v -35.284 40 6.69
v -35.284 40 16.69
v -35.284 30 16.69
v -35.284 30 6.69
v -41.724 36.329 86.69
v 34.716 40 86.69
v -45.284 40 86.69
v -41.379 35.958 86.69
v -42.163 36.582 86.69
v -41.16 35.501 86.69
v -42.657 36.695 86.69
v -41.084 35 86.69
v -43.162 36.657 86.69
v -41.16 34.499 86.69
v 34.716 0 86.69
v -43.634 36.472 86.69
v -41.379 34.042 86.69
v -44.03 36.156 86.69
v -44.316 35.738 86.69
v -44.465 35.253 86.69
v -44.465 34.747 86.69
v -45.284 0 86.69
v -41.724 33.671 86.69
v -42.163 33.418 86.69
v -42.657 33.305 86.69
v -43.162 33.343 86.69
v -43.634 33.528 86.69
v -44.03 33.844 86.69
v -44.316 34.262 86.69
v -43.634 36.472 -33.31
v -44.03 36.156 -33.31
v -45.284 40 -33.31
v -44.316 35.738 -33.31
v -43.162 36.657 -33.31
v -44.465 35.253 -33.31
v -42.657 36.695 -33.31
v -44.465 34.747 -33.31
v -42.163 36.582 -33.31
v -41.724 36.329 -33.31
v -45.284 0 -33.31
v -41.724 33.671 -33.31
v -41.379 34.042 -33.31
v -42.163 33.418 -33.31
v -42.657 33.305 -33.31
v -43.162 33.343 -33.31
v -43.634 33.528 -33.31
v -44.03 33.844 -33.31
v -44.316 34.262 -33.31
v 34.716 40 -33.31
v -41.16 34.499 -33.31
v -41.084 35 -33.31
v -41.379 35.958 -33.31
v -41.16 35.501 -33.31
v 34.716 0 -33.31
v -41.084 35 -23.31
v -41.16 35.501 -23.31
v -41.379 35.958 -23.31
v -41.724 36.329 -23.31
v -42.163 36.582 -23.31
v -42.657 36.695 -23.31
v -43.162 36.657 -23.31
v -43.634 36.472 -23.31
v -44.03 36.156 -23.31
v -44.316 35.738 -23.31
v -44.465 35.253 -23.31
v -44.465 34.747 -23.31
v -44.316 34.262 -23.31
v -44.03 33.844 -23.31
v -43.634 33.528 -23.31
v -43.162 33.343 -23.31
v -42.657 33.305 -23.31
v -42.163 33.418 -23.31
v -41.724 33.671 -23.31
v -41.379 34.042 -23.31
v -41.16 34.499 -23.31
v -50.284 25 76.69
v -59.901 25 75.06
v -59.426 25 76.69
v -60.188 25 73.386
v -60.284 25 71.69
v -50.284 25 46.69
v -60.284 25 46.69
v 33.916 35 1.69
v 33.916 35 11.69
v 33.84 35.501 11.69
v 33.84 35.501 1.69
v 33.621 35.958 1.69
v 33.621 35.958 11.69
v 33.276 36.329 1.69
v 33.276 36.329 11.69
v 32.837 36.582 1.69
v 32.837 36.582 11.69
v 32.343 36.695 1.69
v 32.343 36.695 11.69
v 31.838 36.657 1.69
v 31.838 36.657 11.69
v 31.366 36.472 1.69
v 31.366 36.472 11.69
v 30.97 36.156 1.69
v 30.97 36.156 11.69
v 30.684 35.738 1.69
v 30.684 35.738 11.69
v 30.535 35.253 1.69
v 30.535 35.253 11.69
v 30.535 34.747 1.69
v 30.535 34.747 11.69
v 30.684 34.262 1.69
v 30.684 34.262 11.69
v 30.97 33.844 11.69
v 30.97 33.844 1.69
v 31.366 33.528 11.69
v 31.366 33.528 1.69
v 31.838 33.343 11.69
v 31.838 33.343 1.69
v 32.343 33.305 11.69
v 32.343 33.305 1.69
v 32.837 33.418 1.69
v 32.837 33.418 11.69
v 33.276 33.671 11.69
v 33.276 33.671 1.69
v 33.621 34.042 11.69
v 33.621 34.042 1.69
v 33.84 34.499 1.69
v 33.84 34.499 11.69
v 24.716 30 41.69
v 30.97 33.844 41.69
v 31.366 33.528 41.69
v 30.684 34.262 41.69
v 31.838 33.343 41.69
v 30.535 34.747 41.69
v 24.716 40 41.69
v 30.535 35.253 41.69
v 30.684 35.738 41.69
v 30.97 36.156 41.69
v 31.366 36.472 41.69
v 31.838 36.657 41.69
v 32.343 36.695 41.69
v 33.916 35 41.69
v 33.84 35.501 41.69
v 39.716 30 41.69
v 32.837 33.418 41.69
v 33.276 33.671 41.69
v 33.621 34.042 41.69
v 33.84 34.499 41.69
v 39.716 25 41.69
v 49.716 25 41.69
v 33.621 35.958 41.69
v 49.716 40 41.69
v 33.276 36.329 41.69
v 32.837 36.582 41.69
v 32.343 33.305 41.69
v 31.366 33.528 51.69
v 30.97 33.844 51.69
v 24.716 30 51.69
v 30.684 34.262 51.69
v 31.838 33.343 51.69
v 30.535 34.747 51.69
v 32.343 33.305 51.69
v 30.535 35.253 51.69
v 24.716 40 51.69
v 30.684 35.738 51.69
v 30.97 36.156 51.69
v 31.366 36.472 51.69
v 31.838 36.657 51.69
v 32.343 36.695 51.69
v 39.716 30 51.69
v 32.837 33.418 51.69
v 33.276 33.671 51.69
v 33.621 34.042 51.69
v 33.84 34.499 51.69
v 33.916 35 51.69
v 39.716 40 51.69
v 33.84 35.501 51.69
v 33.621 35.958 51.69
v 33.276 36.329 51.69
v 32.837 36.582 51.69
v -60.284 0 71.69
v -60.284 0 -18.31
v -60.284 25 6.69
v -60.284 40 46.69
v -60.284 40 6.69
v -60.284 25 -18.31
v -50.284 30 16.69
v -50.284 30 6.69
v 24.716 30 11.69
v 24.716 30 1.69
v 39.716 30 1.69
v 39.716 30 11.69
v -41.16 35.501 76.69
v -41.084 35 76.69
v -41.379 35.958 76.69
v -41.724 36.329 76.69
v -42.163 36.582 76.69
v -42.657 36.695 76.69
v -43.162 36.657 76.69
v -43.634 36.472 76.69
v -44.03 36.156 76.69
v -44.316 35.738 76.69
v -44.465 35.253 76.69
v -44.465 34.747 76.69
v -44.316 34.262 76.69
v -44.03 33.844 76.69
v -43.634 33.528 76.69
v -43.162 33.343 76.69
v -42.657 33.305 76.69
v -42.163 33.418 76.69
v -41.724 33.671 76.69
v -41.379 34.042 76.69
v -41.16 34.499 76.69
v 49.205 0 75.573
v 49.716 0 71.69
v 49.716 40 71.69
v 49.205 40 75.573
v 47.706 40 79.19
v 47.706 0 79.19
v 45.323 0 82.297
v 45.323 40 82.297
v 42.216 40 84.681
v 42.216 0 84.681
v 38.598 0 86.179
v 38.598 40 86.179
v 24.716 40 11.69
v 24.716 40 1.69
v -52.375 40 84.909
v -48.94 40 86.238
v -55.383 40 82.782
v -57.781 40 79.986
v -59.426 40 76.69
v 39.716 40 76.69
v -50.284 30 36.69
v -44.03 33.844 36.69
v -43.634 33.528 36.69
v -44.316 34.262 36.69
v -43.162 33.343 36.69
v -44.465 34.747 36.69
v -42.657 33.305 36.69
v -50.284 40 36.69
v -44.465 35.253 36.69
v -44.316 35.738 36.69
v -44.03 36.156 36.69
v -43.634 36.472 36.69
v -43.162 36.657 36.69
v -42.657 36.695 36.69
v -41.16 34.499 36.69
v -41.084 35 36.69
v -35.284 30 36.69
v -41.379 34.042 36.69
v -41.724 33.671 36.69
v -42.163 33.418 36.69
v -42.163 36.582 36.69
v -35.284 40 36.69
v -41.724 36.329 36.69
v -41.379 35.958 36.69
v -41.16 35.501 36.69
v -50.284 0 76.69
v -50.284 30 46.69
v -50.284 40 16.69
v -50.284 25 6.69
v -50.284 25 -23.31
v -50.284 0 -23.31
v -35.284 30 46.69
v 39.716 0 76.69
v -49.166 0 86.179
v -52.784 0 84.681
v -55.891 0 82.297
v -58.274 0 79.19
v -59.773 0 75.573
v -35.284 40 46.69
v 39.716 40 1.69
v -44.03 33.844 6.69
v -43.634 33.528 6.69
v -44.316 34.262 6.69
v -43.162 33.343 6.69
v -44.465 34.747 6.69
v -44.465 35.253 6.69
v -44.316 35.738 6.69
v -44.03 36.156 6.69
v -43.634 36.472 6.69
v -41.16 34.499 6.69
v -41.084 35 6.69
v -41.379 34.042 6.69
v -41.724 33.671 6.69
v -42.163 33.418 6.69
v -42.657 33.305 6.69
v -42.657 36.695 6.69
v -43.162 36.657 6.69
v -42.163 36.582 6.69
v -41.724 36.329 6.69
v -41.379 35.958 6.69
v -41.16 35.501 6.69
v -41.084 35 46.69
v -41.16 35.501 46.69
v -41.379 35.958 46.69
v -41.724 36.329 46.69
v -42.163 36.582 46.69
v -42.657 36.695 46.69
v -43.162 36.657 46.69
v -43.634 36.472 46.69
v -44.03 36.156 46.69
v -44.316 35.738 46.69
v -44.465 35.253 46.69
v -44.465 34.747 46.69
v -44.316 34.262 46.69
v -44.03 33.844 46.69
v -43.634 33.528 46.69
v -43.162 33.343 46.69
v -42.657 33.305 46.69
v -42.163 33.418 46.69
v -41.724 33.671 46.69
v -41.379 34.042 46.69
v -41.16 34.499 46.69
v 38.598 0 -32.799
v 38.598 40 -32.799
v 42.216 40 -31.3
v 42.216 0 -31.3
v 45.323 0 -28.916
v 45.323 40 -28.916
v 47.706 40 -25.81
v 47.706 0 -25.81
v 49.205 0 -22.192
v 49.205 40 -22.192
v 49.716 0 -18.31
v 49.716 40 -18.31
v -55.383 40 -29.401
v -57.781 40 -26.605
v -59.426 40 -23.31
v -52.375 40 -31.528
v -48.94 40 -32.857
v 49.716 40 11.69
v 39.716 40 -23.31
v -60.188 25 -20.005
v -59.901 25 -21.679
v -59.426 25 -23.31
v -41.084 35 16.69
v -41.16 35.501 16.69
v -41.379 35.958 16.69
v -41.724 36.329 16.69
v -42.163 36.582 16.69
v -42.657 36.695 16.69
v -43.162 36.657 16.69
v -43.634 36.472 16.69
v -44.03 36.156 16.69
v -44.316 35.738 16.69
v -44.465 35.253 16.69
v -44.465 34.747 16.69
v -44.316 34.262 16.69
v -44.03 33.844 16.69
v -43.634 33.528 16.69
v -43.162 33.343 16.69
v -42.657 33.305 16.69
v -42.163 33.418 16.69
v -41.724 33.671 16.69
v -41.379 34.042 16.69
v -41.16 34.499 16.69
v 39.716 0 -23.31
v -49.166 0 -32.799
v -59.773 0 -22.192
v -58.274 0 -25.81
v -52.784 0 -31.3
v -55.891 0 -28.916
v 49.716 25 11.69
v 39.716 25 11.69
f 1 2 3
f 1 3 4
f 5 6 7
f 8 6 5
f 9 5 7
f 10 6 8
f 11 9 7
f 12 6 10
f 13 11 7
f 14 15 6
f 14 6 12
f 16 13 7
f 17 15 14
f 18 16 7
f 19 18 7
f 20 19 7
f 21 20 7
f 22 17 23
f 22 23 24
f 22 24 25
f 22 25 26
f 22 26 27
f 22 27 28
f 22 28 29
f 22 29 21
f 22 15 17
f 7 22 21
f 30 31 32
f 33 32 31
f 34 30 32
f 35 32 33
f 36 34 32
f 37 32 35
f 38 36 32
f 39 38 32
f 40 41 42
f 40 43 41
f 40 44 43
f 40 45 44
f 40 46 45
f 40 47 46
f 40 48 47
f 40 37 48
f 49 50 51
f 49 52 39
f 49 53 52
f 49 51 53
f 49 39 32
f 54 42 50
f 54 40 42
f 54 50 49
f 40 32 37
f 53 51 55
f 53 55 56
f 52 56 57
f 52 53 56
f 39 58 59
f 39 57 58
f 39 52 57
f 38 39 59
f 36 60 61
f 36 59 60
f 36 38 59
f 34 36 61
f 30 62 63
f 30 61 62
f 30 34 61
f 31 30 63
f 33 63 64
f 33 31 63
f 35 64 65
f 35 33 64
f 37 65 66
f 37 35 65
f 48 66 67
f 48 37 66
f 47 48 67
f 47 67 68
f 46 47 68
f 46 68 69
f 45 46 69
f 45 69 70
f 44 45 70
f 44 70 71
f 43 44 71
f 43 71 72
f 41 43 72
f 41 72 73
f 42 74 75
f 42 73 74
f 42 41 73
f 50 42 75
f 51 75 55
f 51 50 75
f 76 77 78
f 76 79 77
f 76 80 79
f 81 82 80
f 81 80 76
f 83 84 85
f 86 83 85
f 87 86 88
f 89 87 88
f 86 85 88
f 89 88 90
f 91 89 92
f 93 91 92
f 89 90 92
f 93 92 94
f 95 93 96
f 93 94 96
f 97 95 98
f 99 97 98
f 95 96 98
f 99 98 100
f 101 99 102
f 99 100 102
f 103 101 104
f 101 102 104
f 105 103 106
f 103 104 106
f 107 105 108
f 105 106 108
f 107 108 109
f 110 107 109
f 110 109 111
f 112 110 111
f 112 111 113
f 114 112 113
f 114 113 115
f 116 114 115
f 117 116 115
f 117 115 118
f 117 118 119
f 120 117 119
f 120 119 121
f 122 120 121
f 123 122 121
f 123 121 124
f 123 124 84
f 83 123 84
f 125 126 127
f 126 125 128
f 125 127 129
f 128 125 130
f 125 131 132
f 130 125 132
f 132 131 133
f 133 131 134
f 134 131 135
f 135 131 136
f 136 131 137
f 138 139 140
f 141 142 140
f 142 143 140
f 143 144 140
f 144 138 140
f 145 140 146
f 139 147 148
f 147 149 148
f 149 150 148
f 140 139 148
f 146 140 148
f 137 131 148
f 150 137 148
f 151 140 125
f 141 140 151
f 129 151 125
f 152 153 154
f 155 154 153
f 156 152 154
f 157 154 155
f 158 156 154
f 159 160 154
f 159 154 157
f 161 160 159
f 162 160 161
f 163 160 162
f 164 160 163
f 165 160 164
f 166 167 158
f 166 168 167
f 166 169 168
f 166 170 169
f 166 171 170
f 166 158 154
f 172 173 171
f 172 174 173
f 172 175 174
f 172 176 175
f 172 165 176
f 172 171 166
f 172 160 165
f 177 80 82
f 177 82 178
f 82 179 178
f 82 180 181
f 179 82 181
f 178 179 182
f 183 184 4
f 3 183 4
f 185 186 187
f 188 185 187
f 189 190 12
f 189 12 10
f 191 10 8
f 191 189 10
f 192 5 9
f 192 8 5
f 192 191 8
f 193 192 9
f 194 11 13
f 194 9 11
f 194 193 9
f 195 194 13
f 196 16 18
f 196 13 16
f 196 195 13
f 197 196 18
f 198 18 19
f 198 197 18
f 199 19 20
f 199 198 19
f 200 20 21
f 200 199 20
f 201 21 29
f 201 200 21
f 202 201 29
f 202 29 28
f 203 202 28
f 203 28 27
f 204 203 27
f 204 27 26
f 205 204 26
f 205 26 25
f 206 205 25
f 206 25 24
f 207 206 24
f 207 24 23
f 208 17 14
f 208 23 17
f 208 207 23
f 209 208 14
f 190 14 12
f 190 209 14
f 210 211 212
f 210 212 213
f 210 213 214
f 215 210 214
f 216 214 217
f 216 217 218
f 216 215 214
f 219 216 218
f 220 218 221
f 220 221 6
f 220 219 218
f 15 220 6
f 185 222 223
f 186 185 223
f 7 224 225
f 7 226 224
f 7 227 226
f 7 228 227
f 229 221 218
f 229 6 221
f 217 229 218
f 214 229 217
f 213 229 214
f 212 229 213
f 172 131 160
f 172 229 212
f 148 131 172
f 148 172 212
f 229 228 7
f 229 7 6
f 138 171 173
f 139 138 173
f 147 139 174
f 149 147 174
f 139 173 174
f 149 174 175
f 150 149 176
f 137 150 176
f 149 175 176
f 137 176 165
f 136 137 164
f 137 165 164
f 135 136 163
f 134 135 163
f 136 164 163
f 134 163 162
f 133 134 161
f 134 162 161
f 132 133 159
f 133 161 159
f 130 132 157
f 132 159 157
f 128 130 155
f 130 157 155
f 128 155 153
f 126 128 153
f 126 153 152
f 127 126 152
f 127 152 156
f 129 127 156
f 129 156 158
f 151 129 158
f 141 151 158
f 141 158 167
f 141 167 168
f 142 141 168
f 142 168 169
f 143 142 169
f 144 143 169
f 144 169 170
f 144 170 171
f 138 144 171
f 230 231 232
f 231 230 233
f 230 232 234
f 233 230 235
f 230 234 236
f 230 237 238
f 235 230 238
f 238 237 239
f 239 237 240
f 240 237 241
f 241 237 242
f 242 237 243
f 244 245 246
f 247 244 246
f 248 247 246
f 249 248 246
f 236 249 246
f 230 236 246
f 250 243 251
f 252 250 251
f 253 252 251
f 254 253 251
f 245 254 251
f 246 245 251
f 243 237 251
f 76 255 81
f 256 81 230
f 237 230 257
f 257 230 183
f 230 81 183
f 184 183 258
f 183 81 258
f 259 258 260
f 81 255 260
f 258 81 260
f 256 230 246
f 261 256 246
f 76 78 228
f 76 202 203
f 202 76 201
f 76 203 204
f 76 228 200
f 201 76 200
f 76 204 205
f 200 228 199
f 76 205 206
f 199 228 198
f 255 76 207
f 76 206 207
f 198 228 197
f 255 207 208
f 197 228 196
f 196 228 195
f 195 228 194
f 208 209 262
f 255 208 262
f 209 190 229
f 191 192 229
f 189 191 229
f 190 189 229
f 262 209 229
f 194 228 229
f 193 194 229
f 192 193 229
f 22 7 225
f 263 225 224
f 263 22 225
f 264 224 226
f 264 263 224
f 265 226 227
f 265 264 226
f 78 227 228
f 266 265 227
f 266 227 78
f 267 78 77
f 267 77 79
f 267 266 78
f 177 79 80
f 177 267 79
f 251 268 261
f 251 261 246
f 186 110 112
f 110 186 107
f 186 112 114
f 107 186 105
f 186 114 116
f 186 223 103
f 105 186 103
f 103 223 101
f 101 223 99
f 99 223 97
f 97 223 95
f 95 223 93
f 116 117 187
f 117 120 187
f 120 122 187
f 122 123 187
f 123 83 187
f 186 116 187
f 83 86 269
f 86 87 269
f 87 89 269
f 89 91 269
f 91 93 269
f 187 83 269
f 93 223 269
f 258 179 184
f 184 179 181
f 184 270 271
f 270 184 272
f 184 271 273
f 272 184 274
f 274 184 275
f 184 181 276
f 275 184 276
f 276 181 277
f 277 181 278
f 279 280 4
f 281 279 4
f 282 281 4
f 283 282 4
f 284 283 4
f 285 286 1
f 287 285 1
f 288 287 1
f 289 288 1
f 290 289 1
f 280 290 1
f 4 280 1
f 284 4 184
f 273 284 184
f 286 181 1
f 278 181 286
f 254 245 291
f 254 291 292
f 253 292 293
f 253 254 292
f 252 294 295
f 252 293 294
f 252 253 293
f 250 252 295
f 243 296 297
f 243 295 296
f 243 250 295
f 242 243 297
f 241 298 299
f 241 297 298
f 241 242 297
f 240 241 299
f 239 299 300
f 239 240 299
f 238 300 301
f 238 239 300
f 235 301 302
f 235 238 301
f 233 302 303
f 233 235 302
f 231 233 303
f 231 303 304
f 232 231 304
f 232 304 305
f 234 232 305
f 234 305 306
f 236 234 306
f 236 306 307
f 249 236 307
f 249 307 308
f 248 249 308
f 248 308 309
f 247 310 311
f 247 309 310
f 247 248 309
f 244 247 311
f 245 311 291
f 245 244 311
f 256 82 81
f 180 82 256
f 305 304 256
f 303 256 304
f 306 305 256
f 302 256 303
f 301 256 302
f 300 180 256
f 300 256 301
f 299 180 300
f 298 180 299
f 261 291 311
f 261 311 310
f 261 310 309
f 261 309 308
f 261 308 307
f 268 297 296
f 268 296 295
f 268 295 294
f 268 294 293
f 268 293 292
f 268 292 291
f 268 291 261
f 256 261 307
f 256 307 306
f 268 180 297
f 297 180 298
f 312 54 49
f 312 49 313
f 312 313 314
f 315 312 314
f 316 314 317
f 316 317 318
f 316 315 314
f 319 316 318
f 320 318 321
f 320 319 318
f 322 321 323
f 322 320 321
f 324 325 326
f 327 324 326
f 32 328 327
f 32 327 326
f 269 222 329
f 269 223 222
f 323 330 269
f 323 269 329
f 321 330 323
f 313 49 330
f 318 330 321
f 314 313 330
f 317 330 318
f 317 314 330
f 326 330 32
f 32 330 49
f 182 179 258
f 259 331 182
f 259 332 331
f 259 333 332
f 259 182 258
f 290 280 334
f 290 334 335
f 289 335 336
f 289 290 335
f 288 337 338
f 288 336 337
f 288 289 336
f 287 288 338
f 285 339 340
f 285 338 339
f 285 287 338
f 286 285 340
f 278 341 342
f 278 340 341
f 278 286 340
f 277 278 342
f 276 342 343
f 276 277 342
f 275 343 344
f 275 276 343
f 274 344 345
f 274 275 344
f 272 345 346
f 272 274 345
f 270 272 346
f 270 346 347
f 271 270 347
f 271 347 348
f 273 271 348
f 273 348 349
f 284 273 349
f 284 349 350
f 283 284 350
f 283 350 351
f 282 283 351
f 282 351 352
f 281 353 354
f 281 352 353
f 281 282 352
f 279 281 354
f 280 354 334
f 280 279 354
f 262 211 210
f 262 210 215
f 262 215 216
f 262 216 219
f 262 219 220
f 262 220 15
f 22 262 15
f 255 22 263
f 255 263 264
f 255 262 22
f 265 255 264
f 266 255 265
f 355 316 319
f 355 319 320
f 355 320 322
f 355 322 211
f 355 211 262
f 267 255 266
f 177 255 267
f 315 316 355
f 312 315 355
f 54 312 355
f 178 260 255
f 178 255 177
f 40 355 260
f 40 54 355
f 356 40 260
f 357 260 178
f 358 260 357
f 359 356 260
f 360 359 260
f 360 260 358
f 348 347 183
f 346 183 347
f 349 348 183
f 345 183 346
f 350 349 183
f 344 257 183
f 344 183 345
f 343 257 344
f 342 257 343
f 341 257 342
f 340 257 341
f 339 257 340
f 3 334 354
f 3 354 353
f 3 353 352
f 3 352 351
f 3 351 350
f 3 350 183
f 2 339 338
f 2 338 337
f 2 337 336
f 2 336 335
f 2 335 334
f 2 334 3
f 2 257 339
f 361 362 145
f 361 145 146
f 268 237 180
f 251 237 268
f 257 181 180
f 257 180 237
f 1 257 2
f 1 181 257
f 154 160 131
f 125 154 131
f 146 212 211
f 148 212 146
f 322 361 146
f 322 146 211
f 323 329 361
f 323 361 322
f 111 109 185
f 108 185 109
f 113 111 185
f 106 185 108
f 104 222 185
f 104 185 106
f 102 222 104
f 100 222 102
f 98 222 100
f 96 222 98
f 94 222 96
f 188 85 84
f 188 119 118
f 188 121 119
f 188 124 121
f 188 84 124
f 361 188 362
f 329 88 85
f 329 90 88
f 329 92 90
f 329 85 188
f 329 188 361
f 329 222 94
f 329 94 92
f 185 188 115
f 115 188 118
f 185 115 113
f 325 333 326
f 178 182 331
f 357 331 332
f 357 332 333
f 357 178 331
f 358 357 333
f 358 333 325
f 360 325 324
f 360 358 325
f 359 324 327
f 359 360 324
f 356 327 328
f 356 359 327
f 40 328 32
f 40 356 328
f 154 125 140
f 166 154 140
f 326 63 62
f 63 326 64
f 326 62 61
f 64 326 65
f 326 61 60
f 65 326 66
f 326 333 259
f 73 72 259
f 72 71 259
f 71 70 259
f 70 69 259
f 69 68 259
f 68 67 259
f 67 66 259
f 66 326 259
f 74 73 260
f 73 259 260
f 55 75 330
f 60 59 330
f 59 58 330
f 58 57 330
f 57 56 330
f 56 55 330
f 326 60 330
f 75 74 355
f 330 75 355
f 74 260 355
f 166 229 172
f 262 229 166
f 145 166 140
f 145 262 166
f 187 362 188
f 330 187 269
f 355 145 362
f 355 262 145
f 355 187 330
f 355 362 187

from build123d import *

# Parameters (mm, degrees)
SKETCH1_W               = 90
SKETCH1_H               = 100
BOSS_EXTRUDE1_DEPTH     = 40
SKETCH3_W               = 25
SKETCH3_H               = 40
BOSS_EXTRUDE3_DEPTH     = 10
SKETCH5_W               = 15
SKETCH5_H               = 20
CUT_EXTRUDE1_DEPTH      = 10
SKETCH6_W               = 25
SKETCH6_H               = 10
BOSS_EXTRUDE4_DEPTH     = 10
SKETCH7_W               = 10
SKETCH7_H               = 30
CUT_EXTRUDE2_DEPTH      = 15
CUT_EXTRUDE3_DEPTH      = 108.861822617
CUT_EXTRUDE3_DEPTH_BACK = 108.861822617
SKETCH8_R               = 1.7
SKETCH9_R               = 1.7
CUT_EXTRUDE4_DEPTH      = 57


with BuildPart() as part:
    # Sketch1 → Boss-Extrude1 (new body)
    with BuildSketch(Plane(origin=(0, 0, 0), x_dir=(1, 0, 0), z_dir=(0, 1, 0))):
        with BuildLine():
            Line((-45.284100543, 33.309612736), (34.715899457, 33.309612736))
            ThreePointArc((34.715899457, 33.309612736), (45.322501175, 28.916214454), (49.715899457, 18.309612736))
            Line((49.715899457, 18.309612736), (49.715899457, -71.690387264))
            ThreePointArc((49.715899457, -71.690387264), (45.322501175, -82.296988982), (34.715899457, -86.690387264))
            Line((34.715899457, -86.690387264), (-45.284100543, -86.690387264))
            ThreePointArc((-45.284100543, -86.690387264), (-55.890702261, -82.296988982), (-60.284100543, -71.690387264))
            Line((-60.284100543, -71.690387264), (-60.284100543, 18.309612736))
            ThreePointArc((-60.284100543, 18.309612736), (-55.890702261, 28.916214454), (-45.284100543, 33.309612736))
        make_face()
        with Locations((-5.284100543, -26.690387264)):
            Rectangle(SKETCH1_W, SKETCH1_H, mode=Mode.SUBTRACT)
    extrude(amount=BOSS_EXTRUDE1_DEPTH)

    # Sketch3 → Boss-Extrude3 (add)
    with BuildSketch(Plane(origin=(0, 40, 0), x_dir=(1, 0, 0), z_dir=(0, 1, 0))):
        with Locations((-47.784100543, -26.690387264)):
            Rectangle(SKETCH3_W, SKETCH3_H)
    extrude(amount=-BOSS_EXTRUDE3_DEPTH)

    # Sketch5 → Cut-Extrude1 (cut)
    with BuildSketch(Plane(origin=(0, 40, 0), x_dir=(1, 0, 0), z_dir=(0, 1, 0))):
        with Locations((-42.784100543, -26.690387264)):
            Rectangle(SKETCH5_W, SKETCH5_H)
    extrude(amount=-CUT_EXTRUDE1_DEPTH, mode=Mode.SUBTRACT)

    # Sketch6 → Boss-Extrude4 (add)
    with BuildSketch(Plane(origin=(0, 40, 0), x_dir=(1, 0, 0), z_dir=(0, 1, 0))):
        with Locations((37.215899457, -46.690387264)):
            Rectangle(SKETCH6_W, SKETCH6_H)
        with Locations((37.215899457, -6.690387264)):
            Rectangle(SKETCH6_W, SKETCH6_H)
    extrude(amount=-BOSS_EXTRUDE4_DEPTH)

    # Sketch7 → Cut-Extrude2 (cut)
    with BuildSketch(Plane(origin=(0, 40, 0), x_dir=(1, 0, 0), z_dir=(0, 1, 0))):
        with Locations((-55.284100543, 8.309612736)):
            Rectangle(SKETCH7_W, SKETCH7_H)
        with Locations((-55.284100543, -61.690387264)):
            Rectangle(SKETCH7_W, SKETCH7_H)
        with Locations((44.715899457, -26.690387264)):
            Rectangle(SKETCH7_W, SKETCH7_H)
    extrude(amount=-CUT_EXTRUDE2_DEPTH, mode=Mode.SUBTRACT)

    # Sketch8 → Cut-Extrude3 (cut, two sides: drawn at the far end of the back side and taken through both)
    with BuildSketch(Plane.XY.offset(46.690387264).offset(-CUT_EXTRUDE3_DEPTH_BACK)):
        with Locations((-42.784100543, 35)):
            Circle(SKETCH8_R)
    extrude(amount=CUT_EXTRUDE3_DEPTH + CUT_EXTRUDE3_DEPTH_BACK, mode=Mode.SUBTRACT)

    # Sketch9 → Cut-Extrude4 (cut)
    with BuildSketch(Plane.XY.offset(51.690387264)):
        with Locations((32.215899457, 35)):
            Circle(SKETCH9_R)
    extrude(amount=-CUT_EXTRUDE4_DEPTH, mode=Mode.SUBTRACT)


solid = part.part
